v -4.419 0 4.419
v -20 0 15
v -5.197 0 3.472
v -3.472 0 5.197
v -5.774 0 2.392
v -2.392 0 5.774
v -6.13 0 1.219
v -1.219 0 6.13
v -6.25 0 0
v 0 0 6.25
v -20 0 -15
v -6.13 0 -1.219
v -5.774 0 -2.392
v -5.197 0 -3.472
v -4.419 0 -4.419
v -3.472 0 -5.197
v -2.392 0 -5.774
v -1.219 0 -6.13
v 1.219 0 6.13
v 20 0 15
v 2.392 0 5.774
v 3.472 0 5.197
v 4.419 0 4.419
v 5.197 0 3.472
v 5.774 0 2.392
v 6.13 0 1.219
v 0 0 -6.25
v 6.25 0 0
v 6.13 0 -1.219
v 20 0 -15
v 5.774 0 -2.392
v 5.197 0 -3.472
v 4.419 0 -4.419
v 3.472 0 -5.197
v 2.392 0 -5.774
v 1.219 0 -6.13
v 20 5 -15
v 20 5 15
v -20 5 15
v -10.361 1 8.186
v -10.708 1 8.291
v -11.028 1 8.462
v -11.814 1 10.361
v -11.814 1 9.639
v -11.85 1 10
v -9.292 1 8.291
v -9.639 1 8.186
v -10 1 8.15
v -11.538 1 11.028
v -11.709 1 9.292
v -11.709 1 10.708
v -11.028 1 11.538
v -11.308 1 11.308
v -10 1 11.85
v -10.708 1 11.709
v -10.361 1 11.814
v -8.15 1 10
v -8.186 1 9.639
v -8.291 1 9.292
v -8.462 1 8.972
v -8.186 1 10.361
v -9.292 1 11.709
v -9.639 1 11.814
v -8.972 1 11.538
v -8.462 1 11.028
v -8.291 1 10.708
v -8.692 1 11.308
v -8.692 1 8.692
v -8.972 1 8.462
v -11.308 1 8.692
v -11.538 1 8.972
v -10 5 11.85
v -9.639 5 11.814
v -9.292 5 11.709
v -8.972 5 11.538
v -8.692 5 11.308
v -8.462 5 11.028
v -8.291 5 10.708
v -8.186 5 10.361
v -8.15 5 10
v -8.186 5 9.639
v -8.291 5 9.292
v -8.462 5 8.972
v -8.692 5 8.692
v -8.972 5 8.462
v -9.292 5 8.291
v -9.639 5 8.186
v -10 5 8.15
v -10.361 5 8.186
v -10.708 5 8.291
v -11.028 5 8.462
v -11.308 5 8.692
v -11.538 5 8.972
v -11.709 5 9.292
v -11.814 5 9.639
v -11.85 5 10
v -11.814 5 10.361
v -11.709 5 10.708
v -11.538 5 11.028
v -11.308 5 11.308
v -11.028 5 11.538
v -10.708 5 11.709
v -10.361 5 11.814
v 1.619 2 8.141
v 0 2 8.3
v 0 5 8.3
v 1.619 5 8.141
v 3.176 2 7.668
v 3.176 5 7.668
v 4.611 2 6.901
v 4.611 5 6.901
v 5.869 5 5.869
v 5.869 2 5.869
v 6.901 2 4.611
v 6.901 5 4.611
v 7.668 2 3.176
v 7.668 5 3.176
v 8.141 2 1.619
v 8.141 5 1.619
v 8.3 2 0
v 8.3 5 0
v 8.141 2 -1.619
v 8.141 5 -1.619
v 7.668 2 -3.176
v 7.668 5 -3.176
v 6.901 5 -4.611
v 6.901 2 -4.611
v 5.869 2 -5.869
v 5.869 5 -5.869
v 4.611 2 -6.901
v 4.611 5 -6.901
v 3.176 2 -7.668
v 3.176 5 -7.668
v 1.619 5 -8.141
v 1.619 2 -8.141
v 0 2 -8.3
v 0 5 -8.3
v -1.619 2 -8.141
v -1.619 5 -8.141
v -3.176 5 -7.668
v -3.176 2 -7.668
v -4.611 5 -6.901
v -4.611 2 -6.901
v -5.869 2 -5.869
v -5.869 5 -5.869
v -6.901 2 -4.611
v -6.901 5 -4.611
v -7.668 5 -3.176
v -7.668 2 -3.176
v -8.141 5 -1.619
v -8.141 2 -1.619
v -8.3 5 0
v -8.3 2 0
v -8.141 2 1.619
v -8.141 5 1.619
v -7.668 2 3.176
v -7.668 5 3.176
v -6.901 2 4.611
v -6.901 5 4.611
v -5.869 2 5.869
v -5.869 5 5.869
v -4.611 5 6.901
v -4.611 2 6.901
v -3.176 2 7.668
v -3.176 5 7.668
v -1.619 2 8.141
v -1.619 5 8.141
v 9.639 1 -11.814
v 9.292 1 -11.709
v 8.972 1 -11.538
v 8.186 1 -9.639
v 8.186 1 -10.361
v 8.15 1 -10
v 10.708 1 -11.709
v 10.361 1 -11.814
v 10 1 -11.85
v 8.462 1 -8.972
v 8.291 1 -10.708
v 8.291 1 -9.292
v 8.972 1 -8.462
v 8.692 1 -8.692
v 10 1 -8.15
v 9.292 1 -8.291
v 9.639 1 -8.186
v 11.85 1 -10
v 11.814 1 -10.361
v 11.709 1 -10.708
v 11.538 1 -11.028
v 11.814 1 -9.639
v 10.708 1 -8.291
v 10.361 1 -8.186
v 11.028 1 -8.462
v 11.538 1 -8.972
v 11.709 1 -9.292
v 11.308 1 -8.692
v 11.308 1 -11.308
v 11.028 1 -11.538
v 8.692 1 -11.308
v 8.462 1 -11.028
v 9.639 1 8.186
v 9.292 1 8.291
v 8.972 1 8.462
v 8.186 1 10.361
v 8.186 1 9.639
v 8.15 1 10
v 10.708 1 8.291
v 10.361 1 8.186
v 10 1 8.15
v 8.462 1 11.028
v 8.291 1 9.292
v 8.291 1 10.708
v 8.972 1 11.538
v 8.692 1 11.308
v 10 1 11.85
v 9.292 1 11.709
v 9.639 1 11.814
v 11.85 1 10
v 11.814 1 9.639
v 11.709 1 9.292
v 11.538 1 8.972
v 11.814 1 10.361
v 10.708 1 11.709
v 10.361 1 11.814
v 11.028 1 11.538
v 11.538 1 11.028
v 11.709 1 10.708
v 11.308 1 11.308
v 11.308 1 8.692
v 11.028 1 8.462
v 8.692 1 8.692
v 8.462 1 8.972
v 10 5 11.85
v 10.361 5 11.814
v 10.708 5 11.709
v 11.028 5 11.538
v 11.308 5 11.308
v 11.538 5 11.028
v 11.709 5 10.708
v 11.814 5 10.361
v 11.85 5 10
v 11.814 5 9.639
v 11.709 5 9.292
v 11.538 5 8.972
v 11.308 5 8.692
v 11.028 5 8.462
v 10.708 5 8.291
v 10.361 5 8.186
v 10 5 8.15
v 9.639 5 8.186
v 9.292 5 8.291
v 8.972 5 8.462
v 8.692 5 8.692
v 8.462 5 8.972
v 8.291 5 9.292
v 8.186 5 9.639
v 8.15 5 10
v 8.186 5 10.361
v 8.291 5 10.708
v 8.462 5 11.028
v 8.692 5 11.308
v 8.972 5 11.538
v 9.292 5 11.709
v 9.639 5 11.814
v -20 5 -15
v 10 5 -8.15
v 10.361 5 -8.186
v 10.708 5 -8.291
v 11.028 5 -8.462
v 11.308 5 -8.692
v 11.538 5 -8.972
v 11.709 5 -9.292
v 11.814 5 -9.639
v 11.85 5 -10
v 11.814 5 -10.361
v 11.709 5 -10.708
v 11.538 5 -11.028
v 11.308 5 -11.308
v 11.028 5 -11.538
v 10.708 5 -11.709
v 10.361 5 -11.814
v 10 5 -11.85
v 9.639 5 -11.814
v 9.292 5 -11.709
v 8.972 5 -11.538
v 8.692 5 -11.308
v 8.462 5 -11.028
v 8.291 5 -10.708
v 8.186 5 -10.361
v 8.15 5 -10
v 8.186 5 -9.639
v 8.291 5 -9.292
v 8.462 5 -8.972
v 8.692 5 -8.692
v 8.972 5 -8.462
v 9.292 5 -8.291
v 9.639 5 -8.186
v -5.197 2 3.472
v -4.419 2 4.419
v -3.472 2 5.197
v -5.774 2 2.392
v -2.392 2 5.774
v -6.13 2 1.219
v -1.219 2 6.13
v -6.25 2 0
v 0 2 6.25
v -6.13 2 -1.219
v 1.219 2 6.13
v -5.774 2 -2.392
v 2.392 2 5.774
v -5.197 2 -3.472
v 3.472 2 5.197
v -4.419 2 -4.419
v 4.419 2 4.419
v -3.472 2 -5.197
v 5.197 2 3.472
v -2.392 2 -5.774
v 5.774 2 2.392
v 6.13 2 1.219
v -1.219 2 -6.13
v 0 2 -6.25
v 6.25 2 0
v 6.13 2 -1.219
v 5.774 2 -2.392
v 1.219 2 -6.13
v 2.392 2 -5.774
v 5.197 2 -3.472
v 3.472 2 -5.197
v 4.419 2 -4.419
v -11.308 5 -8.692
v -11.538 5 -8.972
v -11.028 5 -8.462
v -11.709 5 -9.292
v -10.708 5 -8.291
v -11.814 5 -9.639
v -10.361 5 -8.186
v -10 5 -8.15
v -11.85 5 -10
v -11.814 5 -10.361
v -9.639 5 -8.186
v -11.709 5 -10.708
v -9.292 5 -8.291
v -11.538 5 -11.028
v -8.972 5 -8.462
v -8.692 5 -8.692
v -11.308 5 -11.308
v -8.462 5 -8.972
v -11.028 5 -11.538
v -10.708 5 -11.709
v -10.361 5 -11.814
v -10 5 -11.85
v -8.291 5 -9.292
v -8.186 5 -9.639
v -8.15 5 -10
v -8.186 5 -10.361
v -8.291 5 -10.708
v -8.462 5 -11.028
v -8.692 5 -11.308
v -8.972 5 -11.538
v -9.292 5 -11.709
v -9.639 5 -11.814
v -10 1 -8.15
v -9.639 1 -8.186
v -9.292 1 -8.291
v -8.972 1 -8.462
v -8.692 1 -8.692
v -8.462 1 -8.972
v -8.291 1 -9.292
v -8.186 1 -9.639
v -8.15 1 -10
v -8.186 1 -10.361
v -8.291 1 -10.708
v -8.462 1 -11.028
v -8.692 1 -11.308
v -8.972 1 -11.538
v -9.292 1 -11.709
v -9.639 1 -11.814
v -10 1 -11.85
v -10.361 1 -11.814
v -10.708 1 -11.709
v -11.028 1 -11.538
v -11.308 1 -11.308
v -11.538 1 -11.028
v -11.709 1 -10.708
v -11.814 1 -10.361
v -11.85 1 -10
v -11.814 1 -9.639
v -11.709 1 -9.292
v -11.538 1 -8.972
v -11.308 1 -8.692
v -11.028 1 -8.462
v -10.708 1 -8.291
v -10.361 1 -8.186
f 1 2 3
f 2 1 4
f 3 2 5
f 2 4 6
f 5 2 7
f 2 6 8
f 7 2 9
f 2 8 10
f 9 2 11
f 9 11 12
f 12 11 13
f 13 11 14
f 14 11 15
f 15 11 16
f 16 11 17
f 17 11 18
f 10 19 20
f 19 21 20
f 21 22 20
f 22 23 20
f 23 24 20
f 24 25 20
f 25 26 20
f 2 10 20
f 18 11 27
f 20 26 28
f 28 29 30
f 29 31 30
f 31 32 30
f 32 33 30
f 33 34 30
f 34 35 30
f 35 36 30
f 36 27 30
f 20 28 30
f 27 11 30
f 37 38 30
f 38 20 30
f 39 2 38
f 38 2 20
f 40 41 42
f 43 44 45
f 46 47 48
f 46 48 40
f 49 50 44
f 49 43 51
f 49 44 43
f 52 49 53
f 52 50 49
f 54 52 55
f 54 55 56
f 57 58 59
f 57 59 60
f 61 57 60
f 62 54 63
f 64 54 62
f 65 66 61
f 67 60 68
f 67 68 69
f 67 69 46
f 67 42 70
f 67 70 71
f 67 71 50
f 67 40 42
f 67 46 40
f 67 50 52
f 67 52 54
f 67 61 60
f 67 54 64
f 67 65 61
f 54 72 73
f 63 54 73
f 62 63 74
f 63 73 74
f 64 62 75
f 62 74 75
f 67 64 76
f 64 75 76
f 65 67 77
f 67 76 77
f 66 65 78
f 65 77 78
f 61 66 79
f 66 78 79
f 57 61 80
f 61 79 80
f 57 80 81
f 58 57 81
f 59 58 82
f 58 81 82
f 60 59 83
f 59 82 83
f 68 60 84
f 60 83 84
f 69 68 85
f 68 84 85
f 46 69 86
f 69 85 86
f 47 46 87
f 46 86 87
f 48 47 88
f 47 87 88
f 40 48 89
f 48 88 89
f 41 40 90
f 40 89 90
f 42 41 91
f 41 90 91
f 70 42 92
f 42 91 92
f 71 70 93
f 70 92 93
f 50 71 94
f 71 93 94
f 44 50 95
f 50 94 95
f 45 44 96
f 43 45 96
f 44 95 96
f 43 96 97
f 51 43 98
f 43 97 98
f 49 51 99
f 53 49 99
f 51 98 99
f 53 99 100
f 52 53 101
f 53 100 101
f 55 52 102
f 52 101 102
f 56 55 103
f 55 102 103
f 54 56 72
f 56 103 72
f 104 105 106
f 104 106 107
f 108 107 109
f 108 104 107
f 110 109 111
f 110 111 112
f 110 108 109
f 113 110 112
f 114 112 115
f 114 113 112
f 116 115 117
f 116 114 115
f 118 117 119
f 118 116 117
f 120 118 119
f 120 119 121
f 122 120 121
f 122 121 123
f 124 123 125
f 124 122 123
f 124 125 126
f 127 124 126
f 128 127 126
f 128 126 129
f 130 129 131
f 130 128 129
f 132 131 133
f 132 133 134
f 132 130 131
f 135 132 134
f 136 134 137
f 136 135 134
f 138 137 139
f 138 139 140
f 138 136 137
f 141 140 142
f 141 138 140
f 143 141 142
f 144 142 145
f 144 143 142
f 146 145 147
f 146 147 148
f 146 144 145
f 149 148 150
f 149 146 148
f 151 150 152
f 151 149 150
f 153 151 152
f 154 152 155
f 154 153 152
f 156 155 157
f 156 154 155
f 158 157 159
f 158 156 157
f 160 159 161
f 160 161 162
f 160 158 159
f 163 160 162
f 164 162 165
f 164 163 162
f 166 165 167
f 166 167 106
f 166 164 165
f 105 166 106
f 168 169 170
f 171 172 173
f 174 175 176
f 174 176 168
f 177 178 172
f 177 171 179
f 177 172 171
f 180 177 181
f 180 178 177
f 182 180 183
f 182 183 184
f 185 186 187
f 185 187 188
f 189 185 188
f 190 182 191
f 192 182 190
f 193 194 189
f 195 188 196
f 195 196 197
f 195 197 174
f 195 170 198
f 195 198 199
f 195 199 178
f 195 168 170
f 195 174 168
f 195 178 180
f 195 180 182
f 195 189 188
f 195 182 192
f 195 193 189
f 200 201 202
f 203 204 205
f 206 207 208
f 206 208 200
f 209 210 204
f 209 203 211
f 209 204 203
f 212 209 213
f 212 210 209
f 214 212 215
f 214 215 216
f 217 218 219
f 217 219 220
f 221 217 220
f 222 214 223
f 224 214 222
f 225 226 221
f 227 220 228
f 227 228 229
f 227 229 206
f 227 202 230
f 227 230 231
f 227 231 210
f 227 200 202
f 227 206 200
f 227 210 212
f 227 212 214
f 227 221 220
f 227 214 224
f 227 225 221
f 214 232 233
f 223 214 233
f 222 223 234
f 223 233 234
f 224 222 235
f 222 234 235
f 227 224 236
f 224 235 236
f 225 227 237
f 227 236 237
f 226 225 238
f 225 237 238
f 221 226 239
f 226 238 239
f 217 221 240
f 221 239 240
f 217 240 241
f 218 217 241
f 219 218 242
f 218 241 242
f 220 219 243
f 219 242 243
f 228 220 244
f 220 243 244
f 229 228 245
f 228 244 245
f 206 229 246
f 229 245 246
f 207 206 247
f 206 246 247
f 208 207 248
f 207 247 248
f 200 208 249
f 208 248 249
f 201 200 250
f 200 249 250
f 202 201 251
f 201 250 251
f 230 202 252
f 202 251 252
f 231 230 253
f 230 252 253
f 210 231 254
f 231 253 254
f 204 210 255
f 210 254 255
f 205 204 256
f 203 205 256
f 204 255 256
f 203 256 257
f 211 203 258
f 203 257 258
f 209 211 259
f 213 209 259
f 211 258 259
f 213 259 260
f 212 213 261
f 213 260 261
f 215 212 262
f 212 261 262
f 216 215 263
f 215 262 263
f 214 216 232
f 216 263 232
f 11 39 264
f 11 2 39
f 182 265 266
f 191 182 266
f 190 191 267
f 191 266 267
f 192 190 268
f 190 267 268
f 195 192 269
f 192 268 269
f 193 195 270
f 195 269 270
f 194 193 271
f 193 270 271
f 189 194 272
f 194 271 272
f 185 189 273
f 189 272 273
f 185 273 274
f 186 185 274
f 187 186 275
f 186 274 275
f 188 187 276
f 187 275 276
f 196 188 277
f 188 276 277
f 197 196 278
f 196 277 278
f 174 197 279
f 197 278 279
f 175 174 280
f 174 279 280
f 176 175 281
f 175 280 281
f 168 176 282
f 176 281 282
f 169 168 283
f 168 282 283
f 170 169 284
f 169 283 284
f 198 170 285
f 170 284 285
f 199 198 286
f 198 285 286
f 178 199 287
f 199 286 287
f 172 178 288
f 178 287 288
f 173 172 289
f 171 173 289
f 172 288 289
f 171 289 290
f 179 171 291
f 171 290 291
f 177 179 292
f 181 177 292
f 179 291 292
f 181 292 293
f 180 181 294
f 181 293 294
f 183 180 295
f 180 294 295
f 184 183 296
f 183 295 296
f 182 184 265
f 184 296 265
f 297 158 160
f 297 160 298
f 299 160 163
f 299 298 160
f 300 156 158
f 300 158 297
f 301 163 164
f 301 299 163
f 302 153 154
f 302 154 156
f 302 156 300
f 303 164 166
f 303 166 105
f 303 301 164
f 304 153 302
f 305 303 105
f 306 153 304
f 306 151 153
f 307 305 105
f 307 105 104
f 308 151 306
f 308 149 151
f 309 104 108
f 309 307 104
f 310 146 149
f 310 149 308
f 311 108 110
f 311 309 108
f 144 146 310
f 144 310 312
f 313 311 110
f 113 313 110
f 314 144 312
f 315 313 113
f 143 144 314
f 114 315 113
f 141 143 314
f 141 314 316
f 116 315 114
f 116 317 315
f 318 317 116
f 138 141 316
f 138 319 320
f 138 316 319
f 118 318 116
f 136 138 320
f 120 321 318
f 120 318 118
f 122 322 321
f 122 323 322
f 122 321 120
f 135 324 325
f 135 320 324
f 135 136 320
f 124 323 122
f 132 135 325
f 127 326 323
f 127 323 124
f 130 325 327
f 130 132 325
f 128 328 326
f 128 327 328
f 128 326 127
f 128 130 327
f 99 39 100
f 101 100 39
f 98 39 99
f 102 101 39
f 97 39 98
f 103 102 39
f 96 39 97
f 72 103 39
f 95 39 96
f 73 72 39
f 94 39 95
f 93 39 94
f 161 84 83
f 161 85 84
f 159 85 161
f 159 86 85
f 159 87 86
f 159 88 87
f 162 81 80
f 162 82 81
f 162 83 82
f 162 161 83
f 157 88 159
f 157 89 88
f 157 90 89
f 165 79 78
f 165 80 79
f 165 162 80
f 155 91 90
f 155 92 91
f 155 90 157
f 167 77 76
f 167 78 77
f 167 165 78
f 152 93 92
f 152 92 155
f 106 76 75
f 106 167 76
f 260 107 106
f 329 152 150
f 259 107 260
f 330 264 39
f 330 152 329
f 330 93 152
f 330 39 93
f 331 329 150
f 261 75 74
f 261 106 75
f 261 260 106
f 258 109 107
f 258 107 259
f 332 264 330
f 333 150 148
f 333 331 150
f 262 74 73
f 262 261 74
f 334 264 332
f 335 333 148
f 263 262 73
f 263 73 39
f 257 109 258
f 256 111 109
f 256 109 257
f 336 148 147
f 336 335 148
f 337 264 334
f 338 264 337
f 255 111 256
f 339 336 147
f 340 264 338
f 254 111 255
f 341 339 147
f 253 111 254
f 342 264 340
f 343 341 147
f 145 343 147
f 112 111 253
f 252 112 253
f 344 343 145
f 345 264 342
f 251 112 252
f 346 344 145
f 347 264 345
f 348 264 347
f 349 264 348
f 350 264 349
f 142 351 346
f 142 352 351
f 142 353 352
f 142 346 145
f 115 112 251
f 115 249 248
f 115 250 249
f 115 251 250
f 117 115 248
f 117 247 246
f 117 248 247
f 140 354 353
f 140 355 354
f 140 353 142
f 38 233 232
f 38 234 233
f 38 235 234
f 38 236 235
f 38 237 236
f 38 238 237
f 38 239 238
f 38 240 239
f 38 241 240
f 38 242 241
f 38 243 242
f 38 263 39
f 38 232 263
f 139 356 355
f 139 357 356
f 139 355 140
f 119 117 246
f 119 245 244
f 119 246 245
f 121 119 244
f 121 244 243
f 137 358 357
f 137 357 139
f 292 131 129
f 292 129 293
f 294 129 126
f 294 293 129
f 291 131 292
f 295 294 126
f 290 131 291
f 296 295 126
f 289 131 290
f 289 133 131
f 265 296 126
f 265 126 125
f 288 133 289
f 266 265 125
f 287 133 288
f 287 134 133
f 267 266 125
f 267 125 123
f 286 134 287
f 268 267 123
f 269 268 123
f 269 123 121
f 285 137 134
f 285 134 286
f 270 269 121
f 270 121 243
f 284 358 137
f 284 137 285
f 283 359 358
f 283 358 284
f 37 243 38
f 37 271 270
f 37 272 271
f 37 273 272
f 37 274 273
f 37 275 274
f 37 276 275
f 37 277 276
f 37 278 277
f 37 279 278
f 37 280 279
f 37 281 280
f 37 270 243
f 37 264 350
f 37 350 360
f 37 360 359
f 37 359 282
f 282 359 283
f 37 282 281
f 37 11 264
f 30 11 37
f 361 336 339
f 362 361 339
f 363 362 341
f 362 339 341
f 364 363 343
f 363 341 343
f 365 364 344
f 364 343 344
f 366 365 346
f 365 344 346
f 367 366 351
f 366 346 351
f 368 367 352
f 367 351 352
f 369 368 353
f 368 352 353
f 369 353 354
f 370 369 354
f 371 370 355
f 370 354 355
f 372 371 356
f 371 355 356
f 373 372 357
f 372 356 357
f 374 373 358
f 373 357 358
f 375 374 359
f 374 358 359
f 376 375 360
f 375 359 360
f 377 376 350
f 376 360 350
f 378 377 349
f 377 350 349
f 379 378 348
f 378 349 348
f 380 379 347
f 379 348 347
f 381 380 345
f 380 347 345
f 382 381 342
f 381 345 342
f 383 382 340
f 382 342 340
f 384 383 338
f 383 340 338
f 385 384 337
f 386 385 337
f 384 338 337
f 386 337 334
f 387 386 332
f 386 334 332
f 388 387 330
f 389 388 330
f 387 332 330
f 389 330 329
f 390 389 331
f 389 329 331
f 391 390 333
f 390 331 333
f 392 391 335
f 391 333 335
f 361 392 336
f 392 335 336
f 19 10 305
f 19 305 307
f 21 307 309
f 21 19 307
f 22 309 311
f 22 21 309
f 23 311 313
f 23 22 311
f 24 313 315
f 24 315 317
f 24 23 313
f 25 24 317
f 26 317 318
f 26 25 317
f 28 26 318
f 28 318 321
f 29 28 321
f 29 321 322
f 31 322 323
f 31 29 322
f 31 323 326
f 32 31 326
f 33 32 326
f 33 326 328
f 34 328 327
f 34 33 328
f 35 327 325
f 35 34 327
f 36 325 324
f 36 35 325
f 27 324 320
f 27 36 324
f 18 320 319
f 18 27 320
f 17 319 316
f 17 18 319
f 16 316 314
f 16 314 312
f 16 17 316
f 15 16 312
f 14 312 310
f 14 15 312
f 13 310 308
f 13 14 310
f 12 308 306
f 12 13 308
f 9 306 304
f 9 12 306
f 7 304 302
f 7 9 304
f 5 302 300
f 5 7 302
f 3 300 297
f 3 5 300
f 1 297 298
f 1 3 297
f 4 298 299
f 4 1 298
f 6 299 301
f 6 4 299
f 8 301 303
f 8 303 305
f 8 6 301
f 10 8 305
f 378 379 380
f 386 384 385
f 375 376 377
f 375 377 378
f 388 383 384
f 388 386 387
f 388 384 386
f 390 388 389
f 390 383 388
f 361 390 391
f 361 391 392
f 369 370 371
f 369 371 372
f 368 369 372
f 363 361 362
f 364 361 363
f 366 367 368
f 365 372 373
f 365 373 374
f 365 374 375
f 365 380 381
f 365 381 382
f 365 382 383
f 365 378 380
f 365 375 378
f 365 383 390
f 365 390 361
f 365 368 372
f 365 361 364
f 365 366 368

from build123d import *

# Parameters (mm, degrees)
SKETCH1_W            = 40
SKETCH1_H            = 30
SKETCH1_R            = 6.25
BODY_DEPTH           = 2
SKETCH2_W            = 40
SKETCH2_H            = 30
SKETCH2_R            = 8.3
BEARINGS_PLACE_DEPTH = 3
SKETCH3_R            = 1.85
INSERTS_PLACE_DEPTH  = 4


with BuildPart() as part:
    # Sketch1 → Body (new body)
    with BuildSketch(Plane(origin=(0, 0, 0), x_dir=(1, 0, 0), z_dir=(0, 1, 0))):
        Rectangle(SKETCH1_W, SKETCH1_H)
        with Locations(Location((0, 0, 0), (0, 0, 270))):
            Circle(SKETCH1_R, mode=Mode.SUBTRACT)
    extrude(amount=BODY_DEPTH)

    # Sketch2 → Bearings_Place (add)
    with BuildSketch(Plane(origin=(0, 2, 0), x_dir=(1, 0, 0), z_dir=(0, 1, 0))):
        Rectangle(SKETCH2_W, SKETCH2_H)
        with Locations(Location((0, 0, 0), (0, 0, 270))):
            Circle(SKETCH2_R, mode=Mode.SUBTRACT)
    extrude(amount=BEARINGS_PLACE_DEPTH)

    # Sketch3 → Inserts_Place (cut)
    with BuildSketch(Plane(origin=(0, 5, 0), x_dir=(1, 0, 0), z_dir=(0, 1, 0))):
        with Locations(Location((-10, 10, 0), (0, 0, 270))):
            Circle(SKETCH3_R)
        with Locations(Location((10, 10, 0), (0, 0, 270))):
            Circle(SKETCH3_R)
        with Locations(Location((10, -10, 0), (0, 0, 270))):
            Circle(SKETCH3_R)
        with Locations(Location((-10, -10, 0), (0, 0, 270))):
            Circle(SKETCH3_R)
    extrude(amount=-INSERTS_PLACE_DEPTH, mode=Mode.SUBTRACT)


solid = part.part
